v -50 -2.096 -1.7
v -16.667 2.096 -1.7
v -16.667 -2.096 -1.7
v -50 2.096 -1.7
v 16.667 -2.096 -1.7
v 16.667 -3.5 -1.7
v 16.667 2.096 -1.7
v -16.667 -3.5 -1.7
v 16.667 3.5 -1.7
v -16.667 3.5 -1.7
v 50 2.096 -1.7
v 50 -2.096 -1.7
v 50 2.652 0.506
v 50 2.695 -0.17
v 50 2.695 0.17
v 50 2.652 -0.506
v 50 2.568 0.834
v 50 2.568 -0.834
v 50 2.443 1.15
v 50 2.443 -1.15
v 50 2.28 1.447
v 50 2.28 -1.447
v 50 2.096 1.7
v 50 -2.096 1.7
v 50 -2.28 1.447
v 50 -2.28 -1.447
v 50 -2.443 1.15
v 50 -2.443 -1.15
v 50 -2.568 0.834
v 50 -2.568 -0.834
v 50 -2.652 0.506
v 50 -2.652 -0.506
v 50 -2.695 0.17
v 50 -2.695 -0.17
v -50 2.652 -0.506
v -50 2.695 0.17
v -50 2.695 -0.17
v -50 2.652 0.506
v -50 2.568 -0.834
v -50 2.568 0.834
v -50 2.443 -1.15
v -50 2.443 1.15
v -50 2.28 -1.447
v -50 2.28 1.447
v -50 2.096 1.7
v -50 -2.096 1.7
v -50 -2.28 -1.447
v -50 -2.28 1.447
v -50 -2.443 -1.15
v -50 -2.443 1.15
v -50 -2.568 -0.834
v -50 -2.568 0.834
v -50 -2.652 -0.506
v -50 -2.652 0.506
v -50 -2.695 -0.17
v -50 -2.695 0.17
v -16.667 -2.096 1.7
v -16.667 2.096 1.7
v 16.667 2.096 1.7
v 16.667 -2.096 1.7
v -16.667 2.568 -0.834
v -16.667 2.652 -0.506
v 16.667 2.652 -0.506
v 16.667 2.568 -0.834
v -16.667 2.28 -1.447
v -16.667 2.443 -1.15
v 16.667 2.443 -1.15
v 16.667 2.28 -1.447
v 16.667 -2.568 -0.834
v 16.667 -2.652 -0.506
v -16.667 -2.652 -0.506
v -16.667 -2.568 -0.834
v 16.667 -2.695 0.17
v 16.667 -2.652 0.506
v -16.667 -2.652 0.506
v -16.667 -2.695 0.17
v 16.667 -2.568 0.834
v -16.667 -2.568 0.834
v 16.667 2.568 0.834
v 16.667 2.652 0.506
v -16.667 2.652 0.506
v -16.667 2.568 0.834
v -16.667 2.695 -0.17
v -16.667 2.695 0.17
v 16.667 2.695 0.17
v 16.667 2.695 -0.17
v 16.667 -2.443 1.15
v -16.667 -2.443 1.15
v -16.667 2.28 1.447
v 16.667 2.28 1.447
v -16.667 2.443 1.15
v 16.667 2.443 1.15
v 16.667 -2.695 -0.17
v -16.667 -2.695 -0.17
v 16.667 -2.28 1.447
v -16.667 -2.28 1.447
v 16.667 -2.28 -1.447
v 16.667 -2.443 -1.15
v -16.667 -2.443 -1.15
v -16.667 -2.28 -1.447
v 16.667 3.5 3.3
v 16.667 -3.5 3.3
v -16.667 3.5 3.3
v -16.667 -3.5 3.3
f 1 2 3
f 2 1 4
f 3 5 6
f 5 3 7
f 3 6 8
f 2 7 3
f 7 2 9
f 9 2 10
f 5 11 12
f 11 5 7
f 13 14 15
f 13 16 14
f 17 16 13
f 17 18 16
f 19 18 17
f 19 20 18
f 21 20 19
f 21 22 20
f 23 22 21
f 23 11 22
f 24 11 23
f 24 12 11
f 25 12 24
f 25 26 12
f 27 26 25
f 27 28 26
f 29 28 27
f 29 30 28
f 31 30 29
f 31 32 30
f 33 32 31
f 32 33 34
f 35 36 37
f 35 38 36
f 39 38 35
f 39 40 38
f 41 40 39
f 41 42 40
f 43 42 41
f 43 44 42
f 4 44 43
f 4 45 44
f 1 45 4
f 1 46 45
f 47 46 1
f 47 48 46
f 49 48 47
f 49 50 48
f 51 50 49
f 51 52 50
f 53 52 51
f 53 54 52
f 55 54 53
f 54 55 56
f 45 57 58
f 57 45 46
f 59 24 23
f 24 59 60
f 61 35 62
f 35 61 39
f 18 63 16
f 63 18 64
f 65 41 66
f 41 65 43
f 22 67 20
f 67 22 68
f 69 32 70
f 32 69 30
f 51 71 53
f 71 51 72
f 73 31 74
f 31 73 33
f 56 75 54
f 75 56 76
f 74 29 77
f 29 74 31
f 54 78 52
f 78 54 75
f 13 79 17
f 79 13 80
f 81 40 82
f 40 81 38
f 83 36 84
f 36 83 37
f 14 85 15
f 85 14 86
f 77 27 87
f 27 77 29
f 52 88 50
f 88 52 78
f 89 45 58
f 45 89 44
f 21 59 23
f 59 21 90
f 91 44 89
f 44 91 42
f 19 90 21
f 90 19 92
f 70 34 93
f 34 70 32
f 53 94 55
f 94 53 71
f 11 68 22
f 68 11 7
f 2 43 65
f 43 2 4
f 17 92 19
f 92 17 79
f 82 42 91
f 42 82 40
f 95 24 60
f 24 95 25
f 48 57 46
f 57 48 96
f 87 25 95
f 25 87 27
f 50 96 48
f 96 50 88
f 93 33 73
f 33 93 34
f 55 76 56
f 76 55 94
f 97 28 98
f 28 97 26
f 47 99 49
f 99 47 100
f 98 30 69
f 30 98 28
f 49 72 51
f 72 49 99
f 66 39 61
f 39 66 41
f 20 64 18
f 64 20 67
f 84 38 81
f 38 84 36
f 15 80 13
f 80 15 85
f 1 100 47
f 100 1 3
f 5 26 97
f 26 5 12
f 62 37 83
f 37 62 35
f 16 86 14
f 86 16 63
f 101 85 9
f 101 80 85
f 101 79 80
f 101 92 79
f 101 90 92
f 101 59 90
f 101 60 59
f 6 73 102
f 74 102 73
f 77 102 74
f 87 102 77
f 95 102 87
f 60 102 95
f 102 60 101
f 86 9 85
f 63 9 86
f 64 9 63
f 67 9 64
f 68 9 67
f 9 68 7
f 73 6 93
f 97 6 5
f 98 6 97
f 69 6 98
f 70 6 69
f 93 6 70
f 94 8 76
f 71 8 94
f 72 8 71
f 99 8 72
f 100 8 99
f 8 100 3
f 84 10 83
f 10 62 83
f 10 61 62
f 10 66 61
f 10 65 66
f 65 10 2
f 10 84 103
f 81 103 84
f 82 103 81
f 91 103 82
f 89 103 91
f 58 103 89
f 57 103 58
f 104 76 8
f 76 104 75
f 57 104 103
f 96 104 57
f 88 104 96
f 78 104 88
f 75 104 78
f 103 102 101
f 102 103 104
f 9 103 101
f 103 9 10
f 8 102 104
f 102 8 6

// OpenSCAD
$fn = 50;

/*
axle length: 9.2
axle size: 4.65x6.9
axle hole: d=1.75
servo hole: d=4.6 (actually 5), h=3.2
*/

axle(100);

module axle(axle_len)
{
    rotate([0,90,0])
    {
        translate([-0.8,0,0]) cube([5,7,axle_len/3], center=true);

        intersection()
        {
            cube([3.4,5.4,axle_len], center=true);
            cylinder(h=axle_len, d=5.4, center=true);
        }
    }
}
